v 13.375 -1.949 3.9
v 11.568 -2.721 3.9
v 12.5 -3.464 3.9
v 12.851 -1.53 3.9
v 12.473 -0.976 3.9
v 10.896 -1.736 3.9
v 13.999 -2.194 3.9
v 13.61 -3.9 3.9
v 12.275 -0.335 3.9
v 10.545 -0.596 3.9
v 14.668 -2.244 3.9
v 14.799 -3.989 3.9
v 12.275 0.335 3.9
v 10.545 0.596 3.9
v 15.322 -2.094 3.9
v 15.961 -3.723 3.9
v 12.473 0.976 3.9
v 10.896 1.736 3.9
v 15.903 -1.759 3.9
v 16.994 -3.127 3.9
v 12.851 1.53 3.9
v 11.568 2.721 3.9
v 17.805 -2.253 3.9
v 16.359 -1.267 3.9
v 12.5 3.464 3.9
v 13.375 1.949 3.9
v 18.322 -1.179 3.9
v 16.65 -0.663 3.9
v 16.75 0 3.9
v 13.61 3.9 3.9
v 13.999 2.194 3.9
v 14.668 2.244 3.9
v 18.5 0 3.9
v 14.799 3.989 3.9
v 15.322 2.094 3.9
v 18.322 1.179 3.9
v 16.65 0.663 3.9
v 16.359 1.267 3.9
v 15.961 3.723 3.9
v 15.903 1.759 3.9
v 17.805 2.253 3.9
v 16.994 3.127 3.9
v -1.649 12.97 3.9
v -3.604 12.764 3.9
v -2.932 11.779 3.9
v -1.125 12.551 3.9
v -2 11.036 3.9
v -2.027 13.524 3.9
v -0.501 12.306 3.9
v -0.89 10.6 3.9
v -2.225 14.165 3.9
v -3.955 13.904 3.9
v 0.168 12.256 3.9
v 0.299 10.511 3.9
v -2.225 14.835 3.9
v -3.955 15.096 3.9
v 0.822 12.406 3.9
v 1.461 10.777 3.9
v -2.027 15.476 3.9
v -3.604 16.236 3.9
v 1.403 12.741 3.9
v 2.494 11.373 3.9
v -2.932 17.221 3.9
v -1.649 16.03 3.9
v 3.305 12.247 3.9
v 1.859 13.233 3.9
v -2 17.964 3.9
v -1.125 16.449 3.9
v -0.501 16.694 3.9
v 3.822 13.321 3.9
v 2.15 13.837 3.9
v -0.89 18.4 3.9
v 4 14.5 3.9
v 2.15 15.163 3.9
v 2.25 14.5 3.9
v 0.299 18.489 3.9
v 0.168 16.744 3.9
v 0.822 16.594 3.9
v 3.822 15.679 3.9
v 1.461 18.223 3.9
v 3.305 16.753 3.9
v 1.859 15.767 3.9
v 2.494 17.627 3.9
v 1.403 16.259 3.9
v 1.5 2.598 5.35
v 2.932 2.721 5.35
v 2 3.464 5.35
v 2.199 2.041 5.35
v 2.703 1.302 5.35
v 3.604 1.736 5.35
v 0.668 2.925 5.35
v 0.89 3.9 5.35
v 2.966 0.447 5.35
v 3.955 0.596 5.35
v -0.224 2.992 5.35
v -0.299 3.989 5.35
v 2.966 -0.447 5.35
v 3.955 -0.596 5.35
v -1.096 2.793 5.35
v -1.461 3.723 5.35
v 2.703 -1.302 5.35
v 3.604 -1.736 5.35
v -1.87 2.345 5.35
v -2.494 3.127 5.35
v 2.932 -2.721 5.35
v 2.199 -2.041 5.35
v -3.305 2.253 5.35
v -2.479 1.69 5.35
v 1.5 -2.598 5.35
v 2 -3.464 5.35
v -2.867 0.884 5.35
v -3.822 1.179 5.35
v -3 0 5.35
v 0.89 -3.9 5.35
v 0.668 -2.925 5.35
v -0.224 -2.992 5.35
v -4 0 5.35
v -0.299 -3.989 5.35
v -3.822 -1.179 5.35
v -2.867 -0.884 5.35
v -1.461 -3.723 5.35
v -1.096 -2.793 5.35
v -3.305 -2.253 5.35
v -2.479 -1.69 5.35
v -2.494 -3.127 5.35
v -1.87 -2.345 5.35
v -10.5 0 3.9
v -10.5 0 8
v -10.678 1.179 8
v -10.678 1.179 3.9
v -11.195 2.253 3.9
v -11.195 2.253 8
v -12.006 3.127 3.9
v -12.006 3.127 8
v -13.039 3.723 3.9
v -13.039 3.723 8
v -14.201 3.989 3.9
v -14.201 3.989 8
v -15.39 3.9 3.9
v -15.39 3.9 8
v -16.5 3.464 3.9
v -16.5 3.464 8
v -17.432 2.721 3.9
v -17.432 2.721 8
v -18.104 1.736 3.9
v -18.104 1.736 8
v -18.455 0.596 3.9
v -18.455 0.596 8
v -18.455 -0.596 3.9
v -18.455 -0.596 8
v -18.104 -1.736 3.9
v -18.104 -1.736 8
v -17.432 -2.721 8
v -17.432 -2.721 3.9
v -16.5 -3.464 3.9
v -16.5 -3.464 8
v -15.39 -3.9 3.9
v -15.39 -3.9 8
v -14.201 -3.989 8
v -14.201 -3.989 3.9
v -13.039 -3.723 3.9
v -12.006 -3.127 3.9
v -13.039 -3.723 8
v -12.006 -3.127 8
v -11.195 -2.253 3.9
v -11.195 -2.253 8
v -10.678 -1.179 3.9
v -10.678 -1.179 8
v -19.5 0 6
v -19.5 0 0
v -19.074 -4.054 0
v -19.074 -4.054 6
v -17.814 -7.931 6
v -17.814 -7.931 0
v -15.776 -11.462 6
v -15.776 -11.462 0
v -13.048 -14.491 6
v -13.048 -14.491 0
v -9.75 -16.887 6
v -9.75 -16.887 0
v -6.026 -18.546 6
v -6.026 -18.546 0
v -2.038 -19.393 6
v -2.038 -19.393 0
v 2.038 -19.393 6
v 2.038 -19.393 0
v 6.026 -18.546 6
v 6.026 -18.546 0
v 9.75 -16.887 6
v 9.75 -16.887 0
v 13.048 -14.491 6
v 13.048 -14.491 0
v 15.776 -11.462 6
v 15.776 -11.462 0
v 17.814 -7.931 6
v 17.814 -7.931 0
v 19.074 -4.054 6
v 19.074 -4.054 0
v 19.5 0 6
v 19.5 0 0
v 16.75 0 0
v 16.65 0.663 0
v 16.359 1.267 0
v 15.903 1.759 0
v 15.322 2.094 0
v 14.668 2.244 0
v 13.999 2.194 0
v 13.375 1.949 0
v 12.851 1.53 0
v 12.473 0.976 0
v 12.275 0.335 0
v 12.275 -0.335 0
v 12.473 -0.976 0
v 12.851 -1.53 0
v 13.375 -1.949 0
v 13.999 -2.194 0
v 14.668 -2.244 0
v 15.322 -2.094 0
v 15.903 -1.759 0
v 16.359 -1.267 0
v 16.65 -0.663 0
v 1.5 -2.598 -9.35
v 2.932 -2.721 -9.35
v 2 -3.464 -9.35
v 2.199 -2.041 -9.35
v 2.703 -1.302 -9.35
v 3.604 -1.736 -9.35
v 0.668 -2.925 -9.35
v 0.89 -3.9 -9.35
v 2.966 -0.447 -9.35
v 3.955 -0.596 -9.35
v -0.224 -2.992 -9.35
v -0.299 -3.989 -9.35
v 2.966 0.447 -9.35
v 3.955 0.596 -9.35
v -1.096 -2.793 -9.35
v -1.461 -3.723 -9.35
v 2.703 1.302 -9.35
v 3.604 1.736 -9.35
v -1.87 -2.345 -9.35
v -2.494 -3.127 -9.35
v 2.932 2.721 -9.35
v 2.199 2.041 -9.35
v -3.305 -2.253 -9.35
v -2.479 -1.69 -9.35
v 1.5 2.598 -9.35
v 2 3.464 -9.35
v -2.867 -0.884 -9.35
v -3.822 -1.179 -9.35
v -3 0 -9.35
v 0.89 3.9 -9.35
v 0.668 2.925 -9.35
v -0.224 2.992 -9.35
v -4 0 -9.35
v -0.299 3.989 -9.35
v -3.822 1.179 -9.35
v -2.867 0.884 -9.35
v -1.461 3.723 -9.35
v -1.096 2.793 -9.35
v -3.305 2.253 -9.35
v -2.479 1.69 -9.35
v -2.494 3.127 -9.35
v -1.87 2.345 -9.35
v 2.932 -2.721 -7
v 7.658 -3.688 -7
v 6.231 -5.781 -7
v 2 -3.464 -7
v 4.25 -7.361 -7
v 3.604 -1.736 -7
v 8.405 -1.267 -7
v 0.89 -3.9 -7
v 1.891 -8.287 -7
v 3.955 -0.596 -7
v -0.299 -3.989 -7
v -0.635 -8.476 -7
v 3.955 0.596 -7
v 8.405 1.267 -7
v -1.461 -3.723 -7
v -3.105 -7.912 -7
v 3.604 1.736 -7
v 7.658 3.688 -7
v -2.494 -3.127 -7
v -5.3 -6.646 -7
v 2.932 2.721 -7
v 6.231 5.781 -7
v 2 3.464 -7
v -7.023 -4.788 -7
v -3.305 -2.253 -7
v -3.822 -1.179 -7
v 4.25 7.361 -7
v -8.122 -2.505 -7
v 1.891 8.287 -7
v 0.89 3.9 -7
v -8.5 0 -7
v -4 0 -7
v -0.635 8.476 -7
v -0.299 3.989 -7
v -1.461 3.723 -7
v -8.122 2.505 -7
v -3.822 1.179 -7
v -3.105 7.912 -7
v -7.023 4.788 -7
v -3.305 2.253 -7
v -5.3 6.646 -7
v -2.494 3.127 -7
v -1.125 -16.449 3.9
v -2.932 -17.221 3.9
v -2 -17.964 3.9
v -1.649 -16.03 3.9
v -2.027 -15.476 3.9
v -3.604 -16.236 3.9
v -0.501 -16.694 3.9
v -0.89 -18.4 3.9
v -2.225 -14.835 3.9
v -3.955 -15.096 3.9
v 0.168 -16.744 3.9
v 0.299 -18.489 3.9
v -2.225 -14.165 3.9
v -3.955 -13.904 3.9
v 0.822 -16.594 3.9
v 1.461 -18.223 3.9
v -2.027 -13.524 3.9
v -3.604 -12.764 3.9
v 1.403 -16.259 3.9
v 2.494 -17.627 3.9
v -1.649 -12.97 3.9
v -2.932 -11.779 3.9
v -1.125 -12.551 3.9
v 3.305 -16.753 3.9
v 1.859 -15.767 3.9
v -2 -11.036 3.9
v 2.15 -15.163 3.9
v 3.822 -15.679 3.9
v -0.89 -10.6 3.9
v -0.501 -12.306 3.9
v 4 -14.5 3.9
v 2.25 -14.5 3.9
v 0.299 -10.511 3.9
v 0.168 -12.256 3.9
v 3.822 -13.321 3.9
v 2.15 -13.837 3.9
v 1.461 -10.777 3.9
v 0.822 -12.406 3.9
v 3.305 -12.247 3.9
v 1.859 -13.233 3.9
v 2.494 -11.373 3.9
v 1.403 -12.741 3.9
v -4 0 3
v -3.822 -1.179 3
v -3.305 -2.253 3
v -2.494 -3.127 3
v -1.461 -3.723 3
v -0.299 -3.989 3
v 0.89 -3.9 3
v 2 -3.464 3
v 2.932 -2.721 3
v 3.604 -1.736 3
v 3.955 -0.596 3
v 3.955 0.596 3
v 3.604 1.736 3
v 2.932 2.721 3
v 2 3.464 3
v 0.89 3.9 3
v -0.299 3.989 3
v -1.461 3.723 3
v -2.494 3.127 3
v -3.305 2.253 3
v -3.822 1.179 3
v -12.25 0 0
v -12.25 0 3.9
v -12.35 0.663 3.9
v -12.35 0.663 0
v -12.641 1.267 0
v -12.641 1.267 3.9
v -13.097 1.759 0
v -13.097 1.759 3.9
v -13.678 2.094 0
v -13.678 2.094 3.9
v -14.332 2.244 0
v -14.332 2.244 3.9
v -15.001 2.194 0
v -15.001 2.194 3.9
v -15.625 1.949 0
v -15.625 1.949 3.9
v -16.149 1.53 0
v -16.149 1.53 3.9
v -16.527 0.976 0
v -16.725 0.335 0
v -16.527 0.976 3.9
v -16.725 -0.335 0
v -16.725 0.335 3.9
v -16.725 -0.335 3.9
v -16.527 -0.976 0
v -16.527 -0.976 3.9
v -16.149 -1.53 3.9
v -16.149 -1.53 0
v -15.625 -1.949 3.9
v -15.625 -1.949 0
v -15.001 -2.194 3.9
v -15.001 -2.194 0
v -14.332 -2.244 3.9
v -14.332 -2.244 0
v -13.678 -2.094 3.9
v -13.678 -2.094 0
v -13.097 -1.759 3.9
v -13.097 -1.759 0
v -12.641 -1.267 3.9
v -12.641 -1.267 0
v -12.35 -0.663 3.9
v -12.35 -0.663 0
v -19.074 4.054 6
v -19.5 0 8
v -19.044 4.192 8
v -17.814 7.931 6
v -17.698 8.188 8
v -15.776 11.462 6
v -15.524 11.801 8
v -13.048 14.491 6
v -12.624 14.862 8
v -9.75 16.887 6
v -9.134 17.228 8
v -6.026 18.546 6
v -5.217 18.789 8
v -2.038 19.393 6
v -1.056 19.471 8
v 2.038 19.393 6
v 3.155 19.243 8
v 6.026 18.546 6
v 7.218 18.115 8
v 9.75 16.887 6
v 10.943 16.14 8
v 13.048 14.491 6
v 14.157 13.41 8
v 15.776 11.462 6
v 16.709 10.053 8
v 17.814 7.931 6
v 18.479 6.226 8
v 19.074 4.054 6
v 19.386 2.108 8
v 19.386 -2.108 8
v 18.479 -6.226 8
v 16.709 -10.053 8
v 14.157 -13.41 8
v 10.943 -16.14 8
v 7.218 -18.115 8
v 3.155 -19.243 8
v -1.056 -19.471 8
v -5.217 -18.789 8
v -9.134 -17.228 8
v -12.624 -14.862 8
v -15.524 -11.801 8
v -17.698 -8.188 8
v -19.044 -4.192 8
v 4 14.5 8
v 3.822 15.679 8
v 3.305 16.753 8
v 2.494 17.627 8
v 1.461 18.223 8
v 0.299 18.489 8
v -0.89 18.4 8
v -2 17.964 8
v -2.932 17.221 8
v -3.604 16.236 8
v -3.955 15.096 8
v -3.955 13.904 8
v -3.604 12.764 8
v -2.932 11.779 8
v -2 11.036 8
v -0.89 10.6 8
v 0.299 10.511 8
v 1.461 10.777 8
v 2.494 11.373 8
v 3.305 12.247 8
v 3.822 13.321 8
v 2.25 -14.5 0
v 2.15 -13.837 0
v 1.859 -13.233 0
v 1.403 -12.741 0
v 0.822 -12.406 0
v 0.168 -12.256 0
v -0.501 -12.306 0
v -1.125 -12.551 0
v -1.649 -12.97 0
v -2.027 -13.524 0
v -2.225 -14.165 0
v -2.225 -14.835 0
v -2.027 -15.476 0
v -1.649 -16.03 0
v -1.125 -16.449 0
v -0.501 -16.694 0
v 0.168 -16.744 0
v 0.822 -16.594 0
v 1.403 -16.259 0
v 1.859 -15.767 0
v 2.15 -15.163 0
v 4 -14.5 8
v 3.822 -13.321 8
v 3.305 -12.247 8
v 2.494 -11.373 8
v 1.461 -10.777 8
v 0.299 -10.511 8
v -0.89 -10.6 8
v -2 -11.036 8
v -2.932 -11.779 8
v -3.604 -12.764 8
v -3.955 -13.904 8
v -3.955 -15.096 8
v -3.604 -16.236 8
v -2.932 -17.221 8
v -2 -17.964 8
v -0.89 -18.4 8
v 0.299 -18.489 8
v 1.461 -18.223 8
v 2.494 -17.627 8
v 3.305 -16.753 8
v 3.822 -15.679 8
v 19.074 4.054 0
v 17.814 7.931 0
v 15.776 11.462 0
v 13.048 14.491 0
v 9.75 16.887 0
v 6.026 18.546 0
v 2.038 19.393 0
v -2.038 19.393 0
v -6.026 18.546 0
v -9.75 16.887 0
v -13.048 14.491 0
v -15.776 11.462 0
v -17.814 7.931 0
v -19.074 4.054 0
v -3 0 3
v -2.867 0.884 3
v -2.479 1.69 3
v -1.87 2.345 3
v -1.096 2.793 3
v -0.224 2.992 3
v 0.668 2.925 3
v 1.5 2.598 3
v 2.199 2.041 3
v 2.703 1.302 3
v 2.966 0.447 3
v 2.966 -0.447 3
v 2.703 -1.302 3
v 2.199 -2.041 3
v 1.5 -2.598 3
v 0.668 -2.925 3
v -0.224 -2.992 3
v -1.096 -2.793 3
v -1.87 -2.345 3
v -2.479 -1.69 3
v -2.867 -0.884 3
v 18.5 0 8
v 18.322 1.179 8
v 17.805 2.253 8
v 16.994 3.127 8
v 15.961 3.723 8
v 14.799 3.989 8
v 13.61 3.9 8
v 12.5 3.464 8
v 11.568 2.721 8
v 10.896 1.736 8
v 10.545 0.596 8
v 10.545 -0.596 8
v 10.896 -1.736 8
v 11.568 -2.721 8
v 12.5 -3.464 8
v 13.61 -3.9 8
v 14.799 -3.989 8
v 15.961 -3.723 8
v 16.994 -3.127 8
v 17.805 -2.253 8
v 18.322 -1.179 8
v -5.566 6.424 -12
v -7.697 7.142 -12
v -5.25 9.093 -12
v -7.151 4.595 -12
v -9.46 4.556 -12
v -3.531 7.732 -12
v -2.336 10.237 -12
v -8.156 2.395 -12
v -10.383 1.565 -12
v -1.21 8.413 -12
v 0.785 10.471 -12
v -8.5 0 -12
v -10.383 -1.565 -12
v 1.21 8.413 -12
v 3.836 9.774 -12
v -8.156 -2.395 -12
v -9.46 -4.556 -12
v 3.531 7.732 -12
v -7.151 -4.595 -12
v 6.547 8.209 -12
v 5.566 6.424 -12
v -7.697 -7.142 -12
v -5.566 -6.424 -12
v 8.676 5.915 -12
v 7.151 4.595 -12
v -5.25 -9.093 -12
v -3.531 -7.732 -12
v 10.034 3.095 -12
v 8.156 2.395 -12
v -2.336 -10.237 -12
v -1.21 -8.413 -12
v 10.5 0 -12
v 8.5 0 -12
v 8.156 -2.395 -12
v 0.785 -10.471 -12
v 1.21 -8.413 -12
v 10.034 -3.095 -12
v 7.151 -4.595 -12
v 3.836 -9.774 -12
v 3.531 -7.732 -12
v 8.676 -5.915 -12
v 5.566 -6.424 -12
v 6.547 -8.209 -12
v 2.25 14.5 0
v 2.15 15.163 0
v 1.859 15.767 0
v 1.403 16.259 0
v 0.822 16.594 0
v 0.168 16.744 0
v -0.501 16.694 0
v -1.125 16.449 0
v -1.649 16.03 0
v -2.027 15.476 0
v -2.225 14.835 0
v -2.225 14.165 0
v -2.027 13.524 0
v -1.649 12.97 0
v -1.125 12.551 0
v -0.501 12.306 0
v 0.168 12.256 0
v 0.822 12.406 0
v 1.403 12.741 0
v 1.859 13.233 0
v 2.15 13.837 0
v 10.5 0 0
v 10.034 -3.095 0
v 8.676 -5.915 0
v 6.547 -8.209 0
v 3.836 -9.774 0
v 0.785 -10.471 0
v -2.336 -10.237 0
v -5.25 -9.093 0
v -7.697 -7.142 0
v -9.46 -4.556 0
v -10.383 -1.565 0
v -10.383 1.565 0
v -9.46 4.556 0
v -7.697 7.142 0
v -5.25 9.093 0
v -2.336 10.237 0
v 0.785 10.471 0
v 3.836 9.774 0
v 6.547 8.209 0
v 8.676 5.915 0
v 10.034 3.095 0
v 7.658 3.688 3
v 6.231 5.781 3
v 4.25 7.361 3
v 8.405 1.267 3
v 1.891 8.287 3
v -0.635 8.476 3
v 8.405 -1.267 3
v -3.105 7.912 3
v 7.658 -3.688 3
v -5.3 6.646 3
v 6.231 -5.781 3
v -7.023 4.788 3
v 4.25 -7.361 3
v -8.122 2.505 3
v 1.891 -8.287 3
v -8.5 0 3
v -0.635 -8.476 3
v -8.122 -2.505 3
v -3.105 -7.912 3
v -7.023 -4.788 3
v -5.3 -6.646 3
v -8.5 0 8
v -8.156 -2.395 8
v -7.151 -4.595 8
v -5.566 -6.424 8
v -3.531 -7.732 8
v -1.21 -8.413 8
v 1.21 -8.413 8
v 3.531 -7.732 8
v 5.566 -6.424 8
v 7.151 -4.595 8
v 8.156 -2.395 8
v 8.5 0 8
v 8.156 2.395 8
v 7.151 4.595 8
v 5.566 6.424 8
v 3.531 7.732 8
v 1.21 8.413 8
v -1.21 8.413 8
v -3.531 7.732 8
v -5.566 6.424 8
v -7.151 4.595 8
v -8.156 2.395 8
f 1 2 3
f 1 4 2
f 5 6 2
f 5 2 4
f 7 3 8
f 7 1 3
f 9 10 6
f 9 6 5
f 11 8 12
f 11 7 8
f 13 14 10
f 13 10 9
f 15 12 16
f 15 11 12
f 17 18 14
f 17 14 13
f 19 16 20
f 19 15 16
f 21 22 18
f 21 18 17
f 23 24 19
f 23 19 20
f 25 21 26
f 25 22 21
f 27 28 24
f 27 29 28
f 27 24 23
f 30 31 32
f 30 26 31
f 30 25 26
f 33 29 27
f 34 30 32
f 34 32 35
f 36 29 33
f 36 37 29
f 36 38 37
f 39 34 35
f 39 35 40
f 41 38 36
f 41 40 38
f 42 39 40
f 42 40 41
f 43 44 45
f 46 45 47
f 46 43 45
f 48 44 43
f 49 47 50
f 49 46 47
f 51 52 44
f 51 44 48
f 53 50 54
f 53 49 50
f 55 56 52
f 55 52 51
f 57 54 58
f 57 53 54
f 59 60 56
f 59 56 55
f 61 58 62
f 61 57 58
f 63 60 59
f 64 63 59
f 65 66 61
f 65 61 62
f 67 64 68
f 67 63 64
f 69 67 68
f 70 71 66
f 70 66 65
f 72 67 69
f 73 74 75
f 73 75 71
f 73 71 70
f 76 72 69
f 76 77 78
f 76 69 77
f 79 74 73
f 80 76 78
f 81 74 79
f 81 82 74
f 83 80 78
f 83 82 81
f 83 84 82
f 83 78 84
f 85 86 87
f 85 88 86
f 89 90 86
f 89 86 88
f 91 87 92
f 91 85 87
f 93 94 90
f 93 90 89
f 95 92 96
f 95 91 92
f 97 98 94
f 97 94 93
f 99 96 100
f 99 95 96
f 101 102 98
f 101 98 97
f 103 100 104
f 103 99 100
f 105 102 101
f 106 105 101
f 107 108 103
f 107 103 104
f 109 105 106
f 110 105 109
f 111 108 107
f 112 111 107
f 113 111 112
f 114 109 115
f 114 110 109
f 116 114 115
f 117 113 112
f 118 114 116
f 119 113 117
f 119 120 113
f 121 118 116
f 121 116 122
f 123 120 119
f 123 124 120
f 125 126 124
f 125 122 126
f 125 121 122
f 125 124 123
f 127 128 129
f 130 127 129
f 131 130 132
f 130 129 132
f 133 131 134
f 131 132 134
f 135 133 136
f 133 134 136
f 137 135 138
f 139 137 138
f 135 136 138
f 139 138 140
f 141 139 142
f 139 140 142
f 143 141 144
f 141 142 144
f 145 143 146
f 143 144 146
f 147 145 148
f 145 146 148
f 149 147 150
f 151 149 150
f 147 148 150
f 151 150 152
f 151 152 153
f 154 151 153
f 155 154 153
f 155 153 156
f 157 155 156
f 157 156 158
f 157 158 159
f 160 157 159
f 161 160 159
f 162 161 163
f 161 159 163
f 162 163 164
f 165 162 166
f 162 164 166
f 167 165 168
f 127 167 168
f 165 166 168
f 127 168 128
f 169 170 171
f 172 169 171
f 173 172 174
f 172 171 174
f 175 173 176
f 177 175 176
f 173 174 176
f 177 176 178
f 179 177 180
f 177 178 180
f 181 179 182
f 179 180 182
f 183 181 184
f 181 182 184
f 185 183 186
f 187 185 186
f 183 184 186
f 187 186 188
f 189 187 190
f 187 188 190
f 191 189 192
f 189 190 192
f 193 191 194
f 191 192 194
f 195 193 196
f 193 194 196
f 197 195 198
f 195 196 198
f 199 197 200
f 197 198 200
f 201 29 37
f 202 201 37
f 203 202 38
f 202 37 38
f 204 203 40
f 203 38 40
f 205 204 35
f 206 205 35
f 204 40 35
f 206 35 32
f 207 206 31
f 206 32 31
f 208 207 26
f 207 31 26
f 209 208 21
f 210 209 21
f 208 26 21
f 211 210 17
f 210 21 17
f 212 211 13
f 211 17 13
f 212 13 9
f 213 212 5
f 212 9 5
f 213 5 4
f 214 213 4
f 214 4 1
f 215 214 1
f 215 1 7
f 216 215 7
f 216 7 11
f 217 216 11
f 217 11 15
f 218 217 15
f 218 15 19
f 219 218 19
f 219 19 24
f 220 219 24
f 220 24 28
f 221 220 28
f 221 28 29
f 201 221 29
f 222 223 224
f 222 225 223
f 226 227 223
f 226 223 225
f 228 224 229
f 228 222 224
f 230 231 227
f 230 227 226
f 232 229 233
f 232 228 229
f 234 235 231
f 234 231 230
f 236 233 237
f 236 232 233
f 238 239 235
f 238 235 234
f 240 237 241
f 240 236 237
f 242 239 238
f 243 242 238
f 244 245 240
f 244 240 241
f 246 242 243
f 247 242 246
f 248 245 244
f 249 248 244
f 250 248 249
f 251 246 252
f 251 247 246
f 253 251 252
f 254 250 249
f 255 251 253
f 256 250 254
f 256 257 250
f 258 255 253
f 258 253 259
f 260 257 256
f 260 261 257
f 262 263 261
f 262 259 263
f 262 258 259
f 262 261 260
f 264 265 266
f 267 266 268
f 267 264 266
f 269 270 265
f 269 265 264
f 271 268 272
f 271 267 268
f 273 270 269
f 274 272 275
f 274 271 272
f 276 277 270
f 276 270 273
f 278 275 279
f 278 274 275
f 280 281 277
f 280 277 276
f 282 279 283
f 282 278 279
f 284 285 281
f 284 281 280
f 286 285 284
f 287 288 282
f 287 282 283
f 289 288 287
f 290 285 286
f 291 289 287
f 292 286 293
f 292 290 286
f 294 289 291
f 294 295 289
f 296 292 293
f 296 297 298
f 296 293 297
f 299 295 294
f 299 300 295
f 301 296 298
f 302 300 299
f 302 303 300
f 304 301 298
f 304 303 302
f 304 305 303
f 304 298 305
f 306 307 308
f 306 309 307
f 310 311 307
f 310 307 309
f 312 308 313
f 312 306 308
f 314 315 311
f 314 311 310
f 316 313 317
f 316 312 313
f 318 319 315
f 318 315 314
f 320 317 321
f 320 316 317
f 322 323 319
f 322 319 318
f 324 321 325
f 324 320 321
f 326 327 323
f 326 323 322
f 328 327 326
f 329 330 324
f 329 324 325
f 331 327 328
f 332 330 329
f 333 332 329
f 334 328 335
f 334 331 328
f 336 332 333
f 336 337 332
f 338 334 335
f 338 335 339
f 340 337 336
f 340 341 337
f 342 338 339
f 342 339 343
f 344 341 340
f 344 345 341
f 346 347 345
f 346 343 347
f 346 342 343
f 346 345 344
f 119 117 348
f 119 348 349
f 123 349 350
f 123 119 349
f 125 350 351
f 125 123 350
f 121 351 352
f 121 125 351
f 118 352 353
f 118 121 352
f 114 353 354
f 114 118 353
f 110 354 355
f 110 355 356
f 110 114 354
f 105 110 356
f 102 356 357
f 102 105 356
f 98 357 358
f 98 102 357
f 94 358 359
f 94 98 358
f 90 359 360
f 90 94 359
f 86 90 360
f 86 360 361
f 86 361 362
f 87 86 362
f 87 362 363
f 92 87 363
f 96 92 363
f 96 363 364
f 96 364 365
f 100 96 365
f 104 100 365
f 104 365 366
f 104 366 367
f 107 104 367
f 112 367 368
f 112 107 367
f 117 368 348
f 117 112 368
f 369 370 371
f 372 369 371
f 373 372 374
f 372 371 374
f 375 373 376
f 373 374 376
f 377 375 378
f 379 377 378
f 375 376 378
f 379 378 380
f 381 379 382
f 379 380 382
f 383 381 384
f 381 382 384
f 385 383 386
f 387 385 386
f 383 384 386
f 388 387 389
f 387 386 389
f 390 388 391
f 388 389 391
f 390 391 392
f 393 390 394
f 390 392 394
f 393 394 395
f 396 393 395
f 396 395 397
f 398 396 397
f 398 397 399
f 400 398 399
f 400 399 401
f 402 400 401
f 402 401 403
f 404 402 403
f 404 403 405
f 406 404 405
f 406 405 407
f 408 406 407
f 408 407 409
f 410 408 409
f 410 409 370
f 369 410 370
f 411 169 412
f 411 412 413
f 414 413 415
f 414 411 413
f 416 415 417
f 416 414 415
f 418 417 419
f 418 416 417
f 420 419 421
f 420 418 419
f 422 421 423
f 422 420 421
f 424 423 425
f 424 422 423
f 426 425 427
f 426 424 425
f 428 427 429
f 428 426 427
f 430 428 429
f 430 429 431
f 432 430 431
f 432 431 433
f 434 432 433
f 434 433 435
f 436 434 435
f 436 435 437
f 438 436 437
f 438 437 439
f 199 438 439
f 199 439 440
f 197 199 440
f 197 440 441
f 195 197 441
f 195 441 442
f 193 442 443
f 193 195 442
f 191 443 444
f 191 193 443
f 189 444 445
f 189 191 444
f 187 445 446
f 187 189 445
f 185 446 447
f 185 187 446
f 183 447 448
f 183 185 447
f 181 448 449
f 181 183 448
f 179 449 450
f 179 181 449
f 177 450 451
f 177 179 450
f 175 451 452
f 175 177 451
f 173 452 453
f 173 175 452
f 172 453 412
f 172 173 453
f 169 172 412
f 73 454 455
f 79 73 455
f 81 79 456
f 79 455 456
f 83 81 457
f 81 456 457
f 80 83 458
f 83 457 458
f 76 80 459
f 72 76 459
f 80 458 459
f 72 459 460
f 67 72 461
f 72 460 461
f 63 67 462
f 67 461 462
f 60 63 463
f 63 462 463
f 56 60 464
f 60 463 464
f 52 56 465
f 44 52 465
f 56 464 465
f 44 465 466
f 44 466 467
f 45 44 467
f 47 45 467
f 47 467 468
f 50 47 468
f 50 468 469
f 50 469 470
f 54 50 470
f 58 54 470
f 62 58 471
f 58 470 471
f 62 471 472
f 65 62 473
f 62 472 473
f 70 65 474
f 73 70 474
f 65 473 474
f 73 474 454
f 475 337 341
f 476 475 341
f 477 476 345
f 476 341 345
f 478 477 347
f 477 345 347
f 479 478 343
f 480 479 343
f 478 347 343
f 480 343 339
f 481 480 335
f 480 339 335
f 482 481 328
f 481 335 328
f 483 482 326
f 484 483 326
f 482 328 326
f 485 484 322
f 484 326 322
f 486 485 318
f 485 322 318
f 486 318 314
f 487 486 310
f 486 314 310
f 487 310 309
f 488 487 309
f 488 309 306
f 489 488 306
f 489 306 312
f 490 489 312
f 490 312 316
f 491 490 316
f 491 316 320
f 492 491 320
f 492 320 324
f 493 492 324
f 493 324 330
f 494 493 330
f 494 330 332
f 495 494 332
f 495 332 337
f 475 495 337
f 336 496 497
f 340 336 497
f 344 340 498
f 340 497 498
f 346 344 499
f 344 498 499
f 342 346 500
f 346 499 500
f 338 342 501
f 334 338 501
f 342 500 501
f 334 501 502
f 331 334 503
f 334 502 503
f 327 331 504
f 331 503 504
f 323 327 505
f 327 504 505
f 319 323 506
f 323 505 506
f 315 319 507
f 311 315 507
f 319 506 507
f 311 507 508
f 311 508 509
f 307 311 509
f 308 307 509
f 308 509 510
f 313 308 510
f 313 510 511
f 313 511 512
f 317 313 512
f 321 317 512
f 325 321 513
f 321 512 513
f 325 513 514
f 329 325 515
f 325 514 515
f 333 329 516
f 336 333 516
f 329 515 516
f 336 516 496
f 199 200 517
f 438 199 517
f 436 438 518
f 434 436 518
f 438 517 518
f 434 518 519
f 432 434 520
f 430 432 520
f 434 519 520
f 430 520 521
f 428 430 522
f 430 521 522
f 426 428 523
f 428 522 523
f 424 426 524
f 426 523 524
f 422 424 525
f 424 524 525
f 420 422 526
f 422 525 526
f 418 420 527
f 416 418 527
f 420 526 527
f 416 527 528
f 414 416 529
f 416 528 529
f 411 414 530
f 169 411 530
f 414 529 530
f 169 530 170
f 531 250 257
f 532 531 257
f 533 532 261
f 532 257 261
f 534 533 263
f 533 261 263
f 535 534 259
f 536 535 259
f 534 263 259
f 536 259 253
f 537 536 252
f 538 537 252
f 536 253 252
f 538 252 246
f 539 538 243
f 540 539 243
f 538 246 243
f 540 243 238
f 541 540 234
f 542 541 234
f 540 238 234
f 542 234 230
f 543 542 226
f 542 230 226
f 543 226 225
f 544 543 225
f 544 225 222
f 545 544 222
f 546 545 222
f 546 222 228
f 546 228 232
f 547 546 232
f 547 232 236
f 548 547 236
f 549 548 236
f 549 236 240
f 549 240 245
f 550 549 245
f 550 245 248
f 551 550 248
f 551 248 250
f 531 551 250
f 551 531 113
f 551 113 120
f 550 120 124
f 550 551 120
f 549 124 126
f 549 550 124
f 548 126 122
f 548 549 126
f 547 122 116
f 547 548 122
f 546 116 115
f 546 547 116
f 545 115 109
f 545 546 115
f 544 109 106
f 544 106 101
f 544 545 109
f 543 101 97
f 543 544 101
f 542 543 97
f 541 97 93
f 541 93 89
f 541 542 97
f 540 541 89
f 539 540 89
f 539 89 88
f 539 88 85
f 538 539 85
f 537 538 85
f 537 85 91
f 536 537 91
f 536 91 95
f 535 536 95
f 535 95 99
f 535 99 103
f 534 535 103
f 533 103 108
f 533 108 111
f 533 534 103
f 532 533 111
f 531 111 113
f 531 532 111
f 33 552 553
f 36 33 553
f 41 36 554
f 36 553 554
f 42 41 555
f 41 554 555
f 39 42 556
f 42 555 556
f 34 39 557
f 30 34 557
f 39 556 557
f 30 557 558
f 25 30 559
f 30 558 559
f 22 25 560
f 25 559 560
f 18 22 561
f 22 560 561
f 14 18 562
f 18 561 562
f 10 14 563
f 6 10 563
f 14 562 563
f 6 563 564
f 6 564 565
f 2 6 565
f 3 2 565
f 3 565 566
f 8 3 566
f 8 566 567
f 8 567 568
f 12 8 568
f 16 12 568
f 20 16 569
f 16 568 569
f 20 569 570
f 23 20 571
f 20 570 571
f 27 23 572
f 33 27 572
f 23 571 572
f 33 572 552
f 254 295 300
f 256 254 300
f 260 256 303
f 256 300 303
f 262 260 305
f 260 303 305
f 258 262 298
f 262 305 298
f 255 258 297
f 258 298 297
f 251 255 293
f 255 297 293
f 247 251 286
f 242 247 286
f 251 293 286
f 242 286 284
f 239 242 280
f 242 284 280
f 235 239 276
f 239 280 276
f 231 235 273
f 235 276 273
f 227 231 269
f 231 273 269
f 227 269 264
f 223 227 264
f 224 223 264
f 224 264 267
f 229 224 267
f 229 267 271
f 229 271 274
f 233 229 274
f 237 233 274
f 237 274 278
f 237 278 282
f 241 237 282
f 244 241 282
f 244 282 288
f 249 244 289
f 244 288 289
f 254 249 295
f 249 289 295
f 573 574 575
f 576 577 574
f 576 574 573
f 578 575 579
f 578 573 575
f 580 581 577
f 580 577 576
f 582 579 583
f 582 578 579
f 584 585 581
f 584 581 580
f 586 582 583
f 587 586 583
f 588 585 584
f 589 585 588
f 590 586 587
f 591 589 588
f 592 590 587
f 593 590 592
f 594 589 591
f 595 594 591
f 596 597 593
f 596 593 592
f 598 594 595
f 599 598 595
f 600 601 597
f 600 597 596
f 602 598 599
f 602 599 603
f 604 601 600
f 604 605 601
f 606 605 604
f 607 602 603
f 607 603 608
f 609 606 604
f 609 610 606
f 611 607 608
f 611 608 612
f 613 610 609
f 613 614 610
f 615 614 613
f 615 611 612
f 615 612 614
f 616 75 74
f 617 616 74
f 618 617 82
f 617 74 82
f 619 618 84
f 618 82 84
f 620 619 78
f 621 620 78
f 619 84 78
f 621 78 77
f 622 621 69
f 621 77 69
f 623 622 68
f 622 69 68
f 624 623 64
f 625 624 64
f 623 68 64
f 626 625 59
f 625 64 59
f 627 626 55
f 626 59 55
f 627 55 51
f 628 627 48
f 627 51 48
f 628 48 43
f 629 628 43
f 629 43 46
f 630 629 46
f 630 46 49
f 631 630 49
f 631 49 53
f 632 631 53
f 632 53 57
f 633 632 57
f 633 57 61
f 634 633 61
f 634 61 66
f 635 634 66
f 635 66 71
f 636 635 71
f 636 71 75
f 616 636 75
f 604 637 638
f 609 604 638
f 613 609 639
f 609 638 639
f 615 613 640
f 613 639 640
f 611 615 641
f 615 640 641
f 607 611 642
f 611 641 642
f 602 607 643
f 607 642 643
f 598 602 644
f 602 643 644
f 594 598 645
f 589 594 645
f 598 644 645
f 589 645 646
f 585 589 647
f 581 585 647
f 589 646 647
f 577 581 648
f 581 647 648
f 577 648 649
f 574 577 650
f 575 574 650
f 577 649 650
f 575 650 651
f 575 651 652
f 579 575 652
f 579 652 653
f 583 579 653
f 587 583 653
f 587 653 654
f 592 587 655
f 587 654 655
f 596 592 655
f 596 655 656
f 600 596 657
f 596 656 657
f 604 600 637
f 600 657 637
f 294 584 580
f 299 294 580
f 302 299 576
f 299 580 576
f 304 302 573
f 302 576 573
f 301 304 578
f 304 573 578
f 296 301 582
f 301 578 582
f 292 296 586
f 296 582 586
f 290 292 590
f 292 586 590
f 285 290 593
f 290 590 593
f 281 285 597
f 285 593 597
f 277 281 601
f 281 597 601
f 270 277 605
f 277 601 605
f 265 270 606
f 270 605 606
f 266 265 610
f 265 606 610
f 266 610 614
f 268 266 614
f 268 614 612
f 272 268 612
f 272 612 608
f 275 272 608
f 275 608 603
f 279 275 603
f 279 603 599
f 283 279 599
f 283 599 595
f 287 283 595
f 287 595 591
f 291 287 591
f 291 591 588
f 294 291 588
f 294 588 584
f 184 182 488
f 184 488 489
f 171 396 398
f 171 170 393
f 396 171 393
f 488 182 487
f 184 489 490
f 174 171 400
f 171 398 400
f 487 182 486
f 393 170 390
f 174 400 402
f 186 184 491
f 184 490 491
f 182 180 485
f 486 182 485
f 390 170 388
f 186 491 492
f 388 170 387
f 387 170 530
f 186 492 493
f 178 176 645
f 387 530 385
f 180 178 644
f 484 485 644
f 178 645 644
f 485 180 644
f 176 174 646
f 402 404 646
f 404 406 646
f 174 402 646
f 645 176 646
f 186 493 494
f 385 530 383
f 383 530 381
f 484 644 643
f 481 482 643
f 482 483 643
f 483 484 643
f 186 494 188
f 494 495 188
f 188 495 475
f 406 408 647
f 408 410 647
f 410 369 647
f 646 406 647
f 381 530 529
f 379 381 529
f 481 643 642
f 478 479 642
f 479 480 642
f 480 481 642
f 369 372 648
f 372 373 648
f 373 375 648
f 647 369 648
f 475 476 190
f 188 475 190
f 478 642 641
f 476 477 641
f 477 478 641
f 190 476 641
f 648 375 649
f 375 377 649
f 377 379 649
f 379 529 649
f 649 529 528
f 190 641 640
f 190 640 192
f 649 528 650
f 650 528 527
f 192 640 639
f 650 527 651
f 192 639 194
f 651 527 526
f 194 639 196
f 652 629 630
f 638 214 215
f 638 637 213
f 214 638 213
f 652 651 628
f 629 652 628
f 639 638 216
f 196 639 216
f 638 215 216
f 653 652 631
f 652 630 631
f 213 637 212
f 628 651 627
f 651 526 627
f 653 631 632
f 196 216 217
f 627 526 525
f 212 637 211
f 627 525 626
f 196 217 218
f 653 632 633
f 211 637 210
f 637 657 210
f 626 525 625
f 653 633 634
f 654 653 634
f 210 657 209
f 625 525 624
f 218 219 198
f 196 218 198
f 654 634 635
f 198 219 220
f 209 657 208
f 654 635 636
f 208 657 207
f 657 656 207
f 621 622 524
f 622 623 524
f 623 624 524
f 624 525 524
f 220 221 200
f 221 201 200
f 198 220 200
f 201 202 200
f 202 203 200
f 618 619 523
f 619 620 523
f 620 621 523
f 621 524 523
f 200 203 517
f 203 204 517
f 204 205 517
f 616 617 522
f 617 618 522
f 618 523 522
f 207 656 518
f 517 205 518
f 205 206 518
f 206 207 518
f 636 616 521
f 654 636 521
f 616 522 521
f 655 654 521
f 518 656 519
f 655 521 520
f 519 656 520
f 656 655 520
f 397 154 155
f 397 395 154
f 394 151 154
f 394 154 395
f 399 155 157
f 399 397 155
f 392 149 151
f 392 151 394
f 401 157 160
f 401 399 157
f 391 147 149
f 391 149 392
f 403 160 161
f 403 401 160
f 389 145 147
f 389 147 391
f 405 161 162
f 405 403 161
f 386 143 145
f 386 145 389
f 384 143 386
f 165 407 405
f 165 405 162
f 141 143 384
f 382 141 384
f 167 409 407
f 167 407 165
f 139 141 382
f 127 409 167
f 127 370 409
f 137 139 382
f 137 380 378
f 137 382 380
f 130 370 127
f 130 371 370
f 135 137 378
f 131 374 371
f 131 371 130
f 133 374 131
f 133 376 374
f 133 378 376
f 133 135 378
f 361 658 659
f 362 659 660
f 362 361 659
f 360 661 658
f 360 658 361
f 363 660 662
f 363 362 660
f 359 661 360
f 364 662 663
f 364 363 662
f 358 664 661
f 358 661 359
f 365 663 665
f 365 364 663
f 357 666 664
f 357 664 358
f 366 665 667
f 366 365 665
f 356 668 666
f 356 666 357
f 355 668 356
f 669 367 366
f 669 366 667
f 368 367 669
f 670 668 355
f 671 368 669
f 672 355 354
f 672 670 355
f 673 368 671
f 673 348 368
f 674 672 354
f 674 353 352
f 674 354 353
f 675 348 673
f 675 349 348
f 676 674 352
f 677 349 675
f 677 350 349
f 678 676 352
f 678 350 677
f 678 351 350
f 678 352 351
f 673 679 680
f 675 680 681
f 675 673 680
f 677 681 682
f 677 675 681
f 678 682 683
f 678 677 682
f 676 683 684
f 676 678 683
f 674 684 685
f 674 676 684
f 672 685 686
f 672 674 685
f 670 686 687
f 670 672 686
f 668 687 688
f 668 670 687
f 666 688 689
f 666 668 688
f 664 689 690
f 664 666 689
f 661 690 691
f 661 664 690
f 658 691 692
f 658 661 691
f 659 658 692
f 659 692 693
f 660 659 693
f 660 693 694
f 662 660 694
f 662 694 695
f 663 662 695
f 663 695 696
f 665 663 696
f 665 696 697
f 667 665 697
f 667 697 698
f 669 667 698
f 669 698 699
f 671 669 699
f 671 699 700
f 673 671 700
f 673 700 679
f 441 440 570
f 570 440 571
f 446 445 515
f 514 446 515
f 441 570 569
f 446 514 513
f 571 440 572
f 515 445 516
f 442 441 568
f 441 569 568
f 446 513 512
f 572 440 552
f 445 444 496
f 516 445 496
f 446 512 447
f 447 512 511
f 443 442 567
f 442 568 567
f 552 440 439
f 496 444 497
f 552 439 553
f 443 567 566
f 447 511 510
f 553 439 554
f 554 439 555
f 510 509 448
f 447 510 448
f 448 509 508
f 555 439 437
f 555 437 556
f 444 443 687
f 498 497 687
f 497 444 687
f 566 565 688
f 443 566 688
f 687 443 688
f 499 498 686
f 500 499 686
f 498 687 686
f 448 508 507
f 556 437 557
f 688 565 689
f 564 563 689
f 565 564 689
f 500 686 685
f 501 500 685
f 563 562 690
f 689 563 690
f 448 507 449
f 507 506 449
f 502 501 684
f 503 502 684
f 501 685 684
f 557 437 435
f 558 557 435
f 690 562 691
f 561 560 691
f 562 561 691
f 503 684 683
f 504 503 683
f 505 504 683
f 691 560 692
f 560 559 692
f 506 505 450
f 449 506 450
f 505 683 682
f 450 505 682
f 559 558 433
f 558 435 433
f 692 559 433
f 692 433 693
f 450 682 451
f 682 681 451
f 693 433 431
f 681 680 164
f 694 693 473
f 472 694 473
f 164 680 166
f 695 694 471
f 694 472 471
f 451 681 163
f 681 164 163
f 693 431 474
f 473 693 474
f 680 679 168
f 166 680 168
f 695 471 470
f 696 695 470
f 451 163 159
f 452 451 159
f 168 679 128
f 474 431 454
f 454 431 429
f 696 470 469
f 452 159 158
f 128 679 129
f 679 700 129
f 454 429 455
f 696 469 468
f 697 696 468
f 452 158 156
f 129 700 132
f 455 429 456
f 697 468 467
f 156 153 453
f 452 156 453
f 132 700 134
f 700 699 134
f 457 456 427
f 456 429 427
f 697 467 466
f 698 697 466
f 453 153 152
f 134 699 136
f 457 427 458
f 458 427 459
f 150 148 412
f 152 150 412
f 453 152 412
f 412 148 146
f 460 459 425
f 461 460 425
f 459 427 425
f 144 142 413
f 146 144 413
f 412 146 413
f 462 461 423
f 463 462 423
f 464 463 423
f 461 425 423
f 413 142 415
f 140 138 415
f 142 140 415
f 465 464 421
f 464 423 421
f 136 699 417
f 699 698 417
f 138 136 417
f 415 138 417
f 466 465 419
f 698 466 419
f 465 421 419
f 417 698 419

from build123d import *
from build123d.topology import SkipClean

# Parameters (mm, degrees)
SKETCH_1_R           = 19.5
EXTRUDE_1_DEPTH      = 6
SKETCH_2_R           = 9.5
EXTRUDE_2_DEPTH      = 3
SKETCH_3_R           = 5
CUT_EXTRUDE_1_DEPTH  = 50
SKETCH_4_R           = 4
CUT_EXTRUDE_2_DEPTH  = 4.4
SKETCH_5_R           = 2.25
CUT_EXTRUDE_3_DEPTH  = 4.4
SKETCH_6_R           = 2.25
CUT_EXTRUDE_4_DEPTH  = 4.4
SKETCH_7_R           = 2.25
CUT_EXTRUDE_5_DEPTH  = 4.4
SKETCH_8_R           = 10.5
EXTRUDE_3_DEPTH      = 12
SKETCH_9_R           = 8.5
CUT_EXTRUDE_6_DEPTH  = 20
SKETCH_10_R          = 19.5
EXTRUDE_4_DEPTH      = 8
CUT_EXTRUDE_START    = -8
SKETCH_11_R          = 8.5
CUT_EXTRUDE_8_DEPTH  = 8
SKETCH_12_R          = 4
CUT_EXTRUDE_10_DEPTH = 4.1
SKETCH_13_R          = 2.25
CUT_EXTRUDE_11_DEPTH = 4.1
EXTRUDE_START        = -20
SKETCH_14_R          = 8.5
EXTRUDE_5_DEPTH      = 20
SKETCH_15_R          = 8.5
CUT_EXTRUDE_12_DEPTH = 5
SKETCH_17_R          = 4
EXTRUDE_7_DEPTH      = 2.35
SKETCH_18_R          = 3
CUT_EXTRUDE_13_DEPTH = 20
CUT_EXTRUDE_START_2  = -5
SKETCH_19_R          = 8.5
CUT_EXTRUDE_14_DEPTH = 5
EXTRUDE_START_2      = 2.35
SKETCH_20_R          = 4
EXTRUDE_8_DEPTH      = 2.35
CUT_EXTRUDE_START_3  = -2.35
SKETCH_21_R          = 3
CUT_EXTRUDE_15_DEPTH = 2.35


with BuildPart() as part:
    # 草图1 → 凸台-拉伸1 (new body)
    with BuildSketch(Plane.XY):
        Circle(SKETCH_1_R)
    extrude(amount=EXTRUDE_1_DEPTH)

    # 草图2 → 凸台-拉伸2 (add)
    with BuildSketch(Plane(origin=(0, 0, 0), x_dir=(-1, 0, 0), z_dir=(0, 0, -1))):
        Circle(SKETCH_2_R)
    extrude(amount=EXTRUDE_2_DEPTH)

    # 草图3 → 切除-拉伸1 (cut)
    with BuildSketch(Plane(origin=(0, 0, -3), x_dir=(-1, 0, 0), z_dir=(0, 0, -1))):
        Circle(SKETCH_3_R)
    extrude(amount=-CUT_EXTRUDE_1_DEPTH, mode=Mode.SUBTRACT)

    # 草图4 → 切除-拉伸2 (cut)
    with BuildSketch(Plane.XY.offset(6)):
        with Locations((0, 14.5)):
            Circle(SKETCH_4_R)
        with Locations((14.5, 0)):
            Circle(SKETCH_4_R)
        with Locations((0, -14.5)):
            Circle(SKETCH_4_R)
        with Locations((-14.5, 0)):
            Circle(SKETCH_4_R)
    extrude(amount=-CUT_EXTRUDE_2_DEPTH, mode=Mode.SUBTRACT)

    # 草图5 → 切除-拉伸3 (cut)
    with BuildSketch(Plane.XY.offset(1.6)):
        with Locations((-14.5, 0)):
            Circle(SKETCH_5_R)
    extrude(amount=-CUT_EXTRUDE_3_DEPTH, mode=Mode.SUBTRACT)

    # 草图6 → 切除-拉伸4 (cut)
    with BuildSketch(Plane.XY.offset(1.6)):
        with Locations((0, 14.5)):
            Circle(SKETCH_6_R)
    extrude(amount=-CUT_EXTRUDE_4_DEPTH, mode=Mode.SUBTRACT)

    # 草图7 → 切除-拉伸5 (cut)
    with BuildSketch(Plane.XY.offset(1.6)):
        with Locations((14.5, 0)):
            Circle(SKETCH_7_R)
        with Locations((0, -14.5)):
            Circle(SKETCH_7_R)
    extrude(amount=-CUT_EXTRUDE_5_DEPTH, mode=Mode.SUBTRACT)

    # 草图8 → 凸台-拉伸3 (add)
    with BuildSketch(Plane(origin=(0, 0, 0), x_dir=(-1, 0, 0), z_dir=(0, 0, -1))):
        with Locations(Location((0, 0, 0), (0, 0, 180))):
            Circle(SKETCH_8_R)
    extrude(amount=EXTRUDE_3_DEPTH)

    # 草图9 → 切除-拉伸6 (cut)
    with BuildSketch(Plane(origin=(0, 0, -12), x_dir=(-1, 0, 0), z_dir=(0, 0, -1))):
        Circle(SKETCH_9_R)
    extrude(amount=-CUT_EXTRUDE_6_DEPTH, mode=Mode.SUBTRACT)

    # 草图10 → 凸台-拉伸4 (add)
    with SkipClean():  # the faces are left unmerged after this step: merging them gives an invalid solid
        with BuildSketch(Plane(origin=(0, 0, 0), x_dir=(-1, 0, 0), z_dir=(0, 0, -1))):
            Circle(SKETCH_10_R)
        extrude(amount=-EXTRUDE_4_DEPTH)

    # 草图11 → 切除-拉伸8 (cut)
    with SkipClean():  # the faces are left unmerged after this step: merging them gives an invalid solid
        with BuildSketch(Plane.XY.offset(8).offset(CUT_EXTRUDE_START)):
            with Locations(Location((0, 0, 0), (0, 0, 180))):
                Circle(SKETCH_11_R)
        extrude(amount=CUT_EXTRUDE_8_DEPTH, mode=Mode.SUBTRACT)

    # 草图12 → 切除-拉伸10 (cut)
    with SkipClean():  # the faces are left unmerged after this step: merging them gives an invalid solid
        with BuildSketch(Plane.XY.offset(8)):
            with Locations((0, 14.5)):
                Circle(SKETCH_12_R)
            with Locations((14.5, 0)):
                Circle(SKETCH_12_R)
            with Locations((0, -14.5)):
                Circle(SKETCH_12_R)
            with Locations((-14.5, 0)):
                Circle(SKETCH_12_R)
        extrude(amount=-CUT_EXTRUDE_10_DEPTH, mode=Mode.SUBTRACT)

    # 草图13 → 切除-拉伸11 (cut)
    with SkipClean():  # the faces are left unmerged after this step: merging them gives an invalid solid
        with BuildSketch(Plane.XY.offset(3.9)):
            with Locations((0, 14.5)):
                Circle(SKETCH_13_R)
            with Locations((14.5, 0)):
                Circle(SKETCH_13_R)
            with Locations((0, -14.5)):
                Circle(SKETCH_13_R)
            with Locations((-14.5, 0)):
                Circle(SKETCH_13_R)
        extrude(amount=-CUT_EXTRUDE_11_DEPTH, mode=Mode.SUBTRACT)

    # 草图14 → 凸台-拉伸5 (add)
    with SkipClean():  # the faces are left unmerged after this step: merging them gives an invalid solid
        with BuildSketch(Plane.XY.offset(8).offset(EXTRUDE_START)):
            Circle(SKETCH_14_R)
        extrude(amount=EXTRUDE_5_DEPTH)

    # 草图15 → 切除-拉伸12 (cut)
    with SkipClean():  # the faces are left unmerged after this step: merging them gives an invalid solid
        with BuildSketch(Plane(origin=(0, 0, -12), x_dir=(-1, 0, 0), z_dir=(0, 0, -1))):
            Circle(SKETCH_15_R)
        extrude(amount=-CUT_EXTRUDE_12_DEPTH, mode=Mode.SUBTRACT)

    # 草图17 → 凸台-拉伸7 (add)
    with SkipClean():  # the faces are left unmerged after this step: merging them gives an invalid solid
        with BuildSketch(Plane(origin=(0, 0, -7), x_dir=(-1, 0, 0), z_dir=(0, 0, -1))):
            Circle(SKETCH_17_R)
        extrude(amount=EXTRUDE_7_DEPTH)

    # 草图18 → 切除-拉伸13 (cut)
    with SkipClean():  # the faces are left unmerged after this step: merging them gives an invalid solid
        with BuildSketch(Plane(origin=(0, 0, -9.35), x_dir=(-1, 0, 0), z_dir=(0, 0, -1))):
            Circle(SKETCH_18_R)
        extrude(amount=-CUT_EXTRUDE_13_DEPTH, mode=Mode.SUBTRACT)

    # 草图19 → 切除-拉伸14 (cut)
    with SkipClean():  # the faces are left unmerged after this step: merging them gives an invalid solid
        with BuildSketch(Plane.XY.offset(8).offset(CUT_EXTRUDE_START_2)):
            with Locations(Location((0, 0, 0), (0, 0, 180))):
                Circle(SKETCH_19_R)
        extrude(amount=CUT_EXTRUDE_14_DEPTH, mode=Mode.SUBTRACT)

    # 草图20 → 凸台-拉伸8 (add)
    with SkipClean():  # the faces are left unmerged after this step: merging them gives an invalid solid
        with BuildSketch(Plane.XY.offset(3).offset(EXTRUDE_START_2)):
            with Locations(Location((0, 0, 0), (0, 0, 180))):
                Circle(SKETCH_20_R)
        extrude(amount=-EXTRUDE_8_DEPTH)

    # 草图21 → 切除-拉伸15 (cut)
    with SkipClean():  # the faces are left unmerged after this step: merging them gives an invalid solid
        with BuildSketch(Plane.XY.offset(5.35).offset(CUT_EXTRUDE_START_3)):
            with Locations(Location((0, 0, 0), (0, 0, 180))):
                Circle(SKETCH_21_R)
        extrude(amount=CUT_EXTRUDE_15_DEPTH, mode=Mode.SUBTRACT)


solid = part.part
